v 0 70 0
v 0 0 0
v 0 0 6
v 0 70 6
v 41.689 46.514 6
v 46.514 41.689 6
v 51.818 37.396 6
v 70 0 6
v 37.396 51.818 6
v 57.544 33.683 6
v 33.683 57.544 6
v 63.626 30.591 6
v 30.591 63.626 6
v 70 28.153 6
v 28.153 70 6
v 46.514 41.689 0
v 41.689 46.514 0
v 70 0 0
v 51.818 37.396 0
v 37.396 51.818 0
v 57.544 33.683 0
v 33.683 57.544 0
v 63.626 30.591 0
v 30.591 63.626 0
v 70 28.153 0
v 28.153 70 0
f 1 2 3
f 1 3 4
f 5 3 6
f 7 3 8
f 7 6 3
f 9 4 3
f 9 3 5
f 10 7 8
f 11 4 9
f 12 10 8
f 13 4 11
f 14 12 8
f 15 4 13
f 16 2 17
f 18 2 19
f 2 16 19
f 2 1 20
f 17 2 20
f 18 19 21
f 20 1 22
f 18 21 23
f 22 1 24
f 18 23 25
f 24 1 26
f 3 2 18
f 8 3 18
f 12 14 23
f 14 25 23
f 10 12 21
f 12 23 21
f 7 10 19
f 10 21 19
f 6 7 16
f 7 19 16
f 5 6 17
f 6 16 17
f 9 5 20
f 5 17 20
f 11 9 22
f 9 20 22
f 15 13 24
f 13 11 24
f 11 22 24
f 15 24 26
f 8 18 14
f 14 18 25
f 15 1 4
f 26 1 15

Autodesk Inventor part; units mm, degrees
ref_plane "YZ Plane" through (0, 0, 0) normal (1, 0, 0) x (0, 1, 0)
ref_plane "XZ Plane" through (0, 0, 0) normal (0, 1, 0) x (-1, 0, 0)
ref_plane "XY Plane" through (0, 0, 0) normal (0, 0, 1) x (1, 0, 0)
sketch "Szkic1" plane through (0, 0, 0) normal (0, 0, 1) x (1, 0, 0)
  line L0 (0, 0) -> (70, 0) construction
  line L1 (70, 0) -> (70, 70) construction
  line L2 (70, 70) -> (0, 70) construction
  line L3 (0, 70) -> (0, 0) construction
  line L4 (0, 0) -> (6, 0) construction
  line L5 (6, 0) -> (6, 70) construction
  line L6 (6, 70) -> (0, 70) construction
  line L7 (0, 70) -> (0, 0) construction
  line L8 (0, 0) -> (70, 0) construction
  line L9 (70, 0) -> (70, 6) construction
  line L10 (70, 6) -> (0, 6) construction
  line L11 (0, 6) -> (0, 0) construction
  line L12 (6, 6) -> (174, 6) construction
  line L13 (174, 6) -> (174, 174) construction
  line L14 (174, 174) -> (6, 174) construction
  line L15 (6, 174) -> (6, 6) construction
  line L16 (90, 174) -> (90, 6) construction
  circle A0 centre (90, 90) radius 65 construction
  line L17 (0, 0) -> (70, 0)
  line L18 (0, 0) -> (0, 70)
  line L19 (0, 70) -> (28.1534, 70)
  line L20 (70, 0) -> (70, 28.1534)
  arc A1 (28.1534, 70) -> (70, 28.1534) centre (90, 90) ccw
  dimension "d23" = 70
  dimension "d24" = 70
  dimension "d25" = 6
  dimension "d26" = 6
  dimension "d27" = 168
  dimension "d28" = 168
  dimension "d29" = 130
extrude "Wyciągnięcie proste1" add sketch "Szkic1" along normal blind 6
equation "\"d23\" = d24"
properties part number "Naroznik_60x60"
